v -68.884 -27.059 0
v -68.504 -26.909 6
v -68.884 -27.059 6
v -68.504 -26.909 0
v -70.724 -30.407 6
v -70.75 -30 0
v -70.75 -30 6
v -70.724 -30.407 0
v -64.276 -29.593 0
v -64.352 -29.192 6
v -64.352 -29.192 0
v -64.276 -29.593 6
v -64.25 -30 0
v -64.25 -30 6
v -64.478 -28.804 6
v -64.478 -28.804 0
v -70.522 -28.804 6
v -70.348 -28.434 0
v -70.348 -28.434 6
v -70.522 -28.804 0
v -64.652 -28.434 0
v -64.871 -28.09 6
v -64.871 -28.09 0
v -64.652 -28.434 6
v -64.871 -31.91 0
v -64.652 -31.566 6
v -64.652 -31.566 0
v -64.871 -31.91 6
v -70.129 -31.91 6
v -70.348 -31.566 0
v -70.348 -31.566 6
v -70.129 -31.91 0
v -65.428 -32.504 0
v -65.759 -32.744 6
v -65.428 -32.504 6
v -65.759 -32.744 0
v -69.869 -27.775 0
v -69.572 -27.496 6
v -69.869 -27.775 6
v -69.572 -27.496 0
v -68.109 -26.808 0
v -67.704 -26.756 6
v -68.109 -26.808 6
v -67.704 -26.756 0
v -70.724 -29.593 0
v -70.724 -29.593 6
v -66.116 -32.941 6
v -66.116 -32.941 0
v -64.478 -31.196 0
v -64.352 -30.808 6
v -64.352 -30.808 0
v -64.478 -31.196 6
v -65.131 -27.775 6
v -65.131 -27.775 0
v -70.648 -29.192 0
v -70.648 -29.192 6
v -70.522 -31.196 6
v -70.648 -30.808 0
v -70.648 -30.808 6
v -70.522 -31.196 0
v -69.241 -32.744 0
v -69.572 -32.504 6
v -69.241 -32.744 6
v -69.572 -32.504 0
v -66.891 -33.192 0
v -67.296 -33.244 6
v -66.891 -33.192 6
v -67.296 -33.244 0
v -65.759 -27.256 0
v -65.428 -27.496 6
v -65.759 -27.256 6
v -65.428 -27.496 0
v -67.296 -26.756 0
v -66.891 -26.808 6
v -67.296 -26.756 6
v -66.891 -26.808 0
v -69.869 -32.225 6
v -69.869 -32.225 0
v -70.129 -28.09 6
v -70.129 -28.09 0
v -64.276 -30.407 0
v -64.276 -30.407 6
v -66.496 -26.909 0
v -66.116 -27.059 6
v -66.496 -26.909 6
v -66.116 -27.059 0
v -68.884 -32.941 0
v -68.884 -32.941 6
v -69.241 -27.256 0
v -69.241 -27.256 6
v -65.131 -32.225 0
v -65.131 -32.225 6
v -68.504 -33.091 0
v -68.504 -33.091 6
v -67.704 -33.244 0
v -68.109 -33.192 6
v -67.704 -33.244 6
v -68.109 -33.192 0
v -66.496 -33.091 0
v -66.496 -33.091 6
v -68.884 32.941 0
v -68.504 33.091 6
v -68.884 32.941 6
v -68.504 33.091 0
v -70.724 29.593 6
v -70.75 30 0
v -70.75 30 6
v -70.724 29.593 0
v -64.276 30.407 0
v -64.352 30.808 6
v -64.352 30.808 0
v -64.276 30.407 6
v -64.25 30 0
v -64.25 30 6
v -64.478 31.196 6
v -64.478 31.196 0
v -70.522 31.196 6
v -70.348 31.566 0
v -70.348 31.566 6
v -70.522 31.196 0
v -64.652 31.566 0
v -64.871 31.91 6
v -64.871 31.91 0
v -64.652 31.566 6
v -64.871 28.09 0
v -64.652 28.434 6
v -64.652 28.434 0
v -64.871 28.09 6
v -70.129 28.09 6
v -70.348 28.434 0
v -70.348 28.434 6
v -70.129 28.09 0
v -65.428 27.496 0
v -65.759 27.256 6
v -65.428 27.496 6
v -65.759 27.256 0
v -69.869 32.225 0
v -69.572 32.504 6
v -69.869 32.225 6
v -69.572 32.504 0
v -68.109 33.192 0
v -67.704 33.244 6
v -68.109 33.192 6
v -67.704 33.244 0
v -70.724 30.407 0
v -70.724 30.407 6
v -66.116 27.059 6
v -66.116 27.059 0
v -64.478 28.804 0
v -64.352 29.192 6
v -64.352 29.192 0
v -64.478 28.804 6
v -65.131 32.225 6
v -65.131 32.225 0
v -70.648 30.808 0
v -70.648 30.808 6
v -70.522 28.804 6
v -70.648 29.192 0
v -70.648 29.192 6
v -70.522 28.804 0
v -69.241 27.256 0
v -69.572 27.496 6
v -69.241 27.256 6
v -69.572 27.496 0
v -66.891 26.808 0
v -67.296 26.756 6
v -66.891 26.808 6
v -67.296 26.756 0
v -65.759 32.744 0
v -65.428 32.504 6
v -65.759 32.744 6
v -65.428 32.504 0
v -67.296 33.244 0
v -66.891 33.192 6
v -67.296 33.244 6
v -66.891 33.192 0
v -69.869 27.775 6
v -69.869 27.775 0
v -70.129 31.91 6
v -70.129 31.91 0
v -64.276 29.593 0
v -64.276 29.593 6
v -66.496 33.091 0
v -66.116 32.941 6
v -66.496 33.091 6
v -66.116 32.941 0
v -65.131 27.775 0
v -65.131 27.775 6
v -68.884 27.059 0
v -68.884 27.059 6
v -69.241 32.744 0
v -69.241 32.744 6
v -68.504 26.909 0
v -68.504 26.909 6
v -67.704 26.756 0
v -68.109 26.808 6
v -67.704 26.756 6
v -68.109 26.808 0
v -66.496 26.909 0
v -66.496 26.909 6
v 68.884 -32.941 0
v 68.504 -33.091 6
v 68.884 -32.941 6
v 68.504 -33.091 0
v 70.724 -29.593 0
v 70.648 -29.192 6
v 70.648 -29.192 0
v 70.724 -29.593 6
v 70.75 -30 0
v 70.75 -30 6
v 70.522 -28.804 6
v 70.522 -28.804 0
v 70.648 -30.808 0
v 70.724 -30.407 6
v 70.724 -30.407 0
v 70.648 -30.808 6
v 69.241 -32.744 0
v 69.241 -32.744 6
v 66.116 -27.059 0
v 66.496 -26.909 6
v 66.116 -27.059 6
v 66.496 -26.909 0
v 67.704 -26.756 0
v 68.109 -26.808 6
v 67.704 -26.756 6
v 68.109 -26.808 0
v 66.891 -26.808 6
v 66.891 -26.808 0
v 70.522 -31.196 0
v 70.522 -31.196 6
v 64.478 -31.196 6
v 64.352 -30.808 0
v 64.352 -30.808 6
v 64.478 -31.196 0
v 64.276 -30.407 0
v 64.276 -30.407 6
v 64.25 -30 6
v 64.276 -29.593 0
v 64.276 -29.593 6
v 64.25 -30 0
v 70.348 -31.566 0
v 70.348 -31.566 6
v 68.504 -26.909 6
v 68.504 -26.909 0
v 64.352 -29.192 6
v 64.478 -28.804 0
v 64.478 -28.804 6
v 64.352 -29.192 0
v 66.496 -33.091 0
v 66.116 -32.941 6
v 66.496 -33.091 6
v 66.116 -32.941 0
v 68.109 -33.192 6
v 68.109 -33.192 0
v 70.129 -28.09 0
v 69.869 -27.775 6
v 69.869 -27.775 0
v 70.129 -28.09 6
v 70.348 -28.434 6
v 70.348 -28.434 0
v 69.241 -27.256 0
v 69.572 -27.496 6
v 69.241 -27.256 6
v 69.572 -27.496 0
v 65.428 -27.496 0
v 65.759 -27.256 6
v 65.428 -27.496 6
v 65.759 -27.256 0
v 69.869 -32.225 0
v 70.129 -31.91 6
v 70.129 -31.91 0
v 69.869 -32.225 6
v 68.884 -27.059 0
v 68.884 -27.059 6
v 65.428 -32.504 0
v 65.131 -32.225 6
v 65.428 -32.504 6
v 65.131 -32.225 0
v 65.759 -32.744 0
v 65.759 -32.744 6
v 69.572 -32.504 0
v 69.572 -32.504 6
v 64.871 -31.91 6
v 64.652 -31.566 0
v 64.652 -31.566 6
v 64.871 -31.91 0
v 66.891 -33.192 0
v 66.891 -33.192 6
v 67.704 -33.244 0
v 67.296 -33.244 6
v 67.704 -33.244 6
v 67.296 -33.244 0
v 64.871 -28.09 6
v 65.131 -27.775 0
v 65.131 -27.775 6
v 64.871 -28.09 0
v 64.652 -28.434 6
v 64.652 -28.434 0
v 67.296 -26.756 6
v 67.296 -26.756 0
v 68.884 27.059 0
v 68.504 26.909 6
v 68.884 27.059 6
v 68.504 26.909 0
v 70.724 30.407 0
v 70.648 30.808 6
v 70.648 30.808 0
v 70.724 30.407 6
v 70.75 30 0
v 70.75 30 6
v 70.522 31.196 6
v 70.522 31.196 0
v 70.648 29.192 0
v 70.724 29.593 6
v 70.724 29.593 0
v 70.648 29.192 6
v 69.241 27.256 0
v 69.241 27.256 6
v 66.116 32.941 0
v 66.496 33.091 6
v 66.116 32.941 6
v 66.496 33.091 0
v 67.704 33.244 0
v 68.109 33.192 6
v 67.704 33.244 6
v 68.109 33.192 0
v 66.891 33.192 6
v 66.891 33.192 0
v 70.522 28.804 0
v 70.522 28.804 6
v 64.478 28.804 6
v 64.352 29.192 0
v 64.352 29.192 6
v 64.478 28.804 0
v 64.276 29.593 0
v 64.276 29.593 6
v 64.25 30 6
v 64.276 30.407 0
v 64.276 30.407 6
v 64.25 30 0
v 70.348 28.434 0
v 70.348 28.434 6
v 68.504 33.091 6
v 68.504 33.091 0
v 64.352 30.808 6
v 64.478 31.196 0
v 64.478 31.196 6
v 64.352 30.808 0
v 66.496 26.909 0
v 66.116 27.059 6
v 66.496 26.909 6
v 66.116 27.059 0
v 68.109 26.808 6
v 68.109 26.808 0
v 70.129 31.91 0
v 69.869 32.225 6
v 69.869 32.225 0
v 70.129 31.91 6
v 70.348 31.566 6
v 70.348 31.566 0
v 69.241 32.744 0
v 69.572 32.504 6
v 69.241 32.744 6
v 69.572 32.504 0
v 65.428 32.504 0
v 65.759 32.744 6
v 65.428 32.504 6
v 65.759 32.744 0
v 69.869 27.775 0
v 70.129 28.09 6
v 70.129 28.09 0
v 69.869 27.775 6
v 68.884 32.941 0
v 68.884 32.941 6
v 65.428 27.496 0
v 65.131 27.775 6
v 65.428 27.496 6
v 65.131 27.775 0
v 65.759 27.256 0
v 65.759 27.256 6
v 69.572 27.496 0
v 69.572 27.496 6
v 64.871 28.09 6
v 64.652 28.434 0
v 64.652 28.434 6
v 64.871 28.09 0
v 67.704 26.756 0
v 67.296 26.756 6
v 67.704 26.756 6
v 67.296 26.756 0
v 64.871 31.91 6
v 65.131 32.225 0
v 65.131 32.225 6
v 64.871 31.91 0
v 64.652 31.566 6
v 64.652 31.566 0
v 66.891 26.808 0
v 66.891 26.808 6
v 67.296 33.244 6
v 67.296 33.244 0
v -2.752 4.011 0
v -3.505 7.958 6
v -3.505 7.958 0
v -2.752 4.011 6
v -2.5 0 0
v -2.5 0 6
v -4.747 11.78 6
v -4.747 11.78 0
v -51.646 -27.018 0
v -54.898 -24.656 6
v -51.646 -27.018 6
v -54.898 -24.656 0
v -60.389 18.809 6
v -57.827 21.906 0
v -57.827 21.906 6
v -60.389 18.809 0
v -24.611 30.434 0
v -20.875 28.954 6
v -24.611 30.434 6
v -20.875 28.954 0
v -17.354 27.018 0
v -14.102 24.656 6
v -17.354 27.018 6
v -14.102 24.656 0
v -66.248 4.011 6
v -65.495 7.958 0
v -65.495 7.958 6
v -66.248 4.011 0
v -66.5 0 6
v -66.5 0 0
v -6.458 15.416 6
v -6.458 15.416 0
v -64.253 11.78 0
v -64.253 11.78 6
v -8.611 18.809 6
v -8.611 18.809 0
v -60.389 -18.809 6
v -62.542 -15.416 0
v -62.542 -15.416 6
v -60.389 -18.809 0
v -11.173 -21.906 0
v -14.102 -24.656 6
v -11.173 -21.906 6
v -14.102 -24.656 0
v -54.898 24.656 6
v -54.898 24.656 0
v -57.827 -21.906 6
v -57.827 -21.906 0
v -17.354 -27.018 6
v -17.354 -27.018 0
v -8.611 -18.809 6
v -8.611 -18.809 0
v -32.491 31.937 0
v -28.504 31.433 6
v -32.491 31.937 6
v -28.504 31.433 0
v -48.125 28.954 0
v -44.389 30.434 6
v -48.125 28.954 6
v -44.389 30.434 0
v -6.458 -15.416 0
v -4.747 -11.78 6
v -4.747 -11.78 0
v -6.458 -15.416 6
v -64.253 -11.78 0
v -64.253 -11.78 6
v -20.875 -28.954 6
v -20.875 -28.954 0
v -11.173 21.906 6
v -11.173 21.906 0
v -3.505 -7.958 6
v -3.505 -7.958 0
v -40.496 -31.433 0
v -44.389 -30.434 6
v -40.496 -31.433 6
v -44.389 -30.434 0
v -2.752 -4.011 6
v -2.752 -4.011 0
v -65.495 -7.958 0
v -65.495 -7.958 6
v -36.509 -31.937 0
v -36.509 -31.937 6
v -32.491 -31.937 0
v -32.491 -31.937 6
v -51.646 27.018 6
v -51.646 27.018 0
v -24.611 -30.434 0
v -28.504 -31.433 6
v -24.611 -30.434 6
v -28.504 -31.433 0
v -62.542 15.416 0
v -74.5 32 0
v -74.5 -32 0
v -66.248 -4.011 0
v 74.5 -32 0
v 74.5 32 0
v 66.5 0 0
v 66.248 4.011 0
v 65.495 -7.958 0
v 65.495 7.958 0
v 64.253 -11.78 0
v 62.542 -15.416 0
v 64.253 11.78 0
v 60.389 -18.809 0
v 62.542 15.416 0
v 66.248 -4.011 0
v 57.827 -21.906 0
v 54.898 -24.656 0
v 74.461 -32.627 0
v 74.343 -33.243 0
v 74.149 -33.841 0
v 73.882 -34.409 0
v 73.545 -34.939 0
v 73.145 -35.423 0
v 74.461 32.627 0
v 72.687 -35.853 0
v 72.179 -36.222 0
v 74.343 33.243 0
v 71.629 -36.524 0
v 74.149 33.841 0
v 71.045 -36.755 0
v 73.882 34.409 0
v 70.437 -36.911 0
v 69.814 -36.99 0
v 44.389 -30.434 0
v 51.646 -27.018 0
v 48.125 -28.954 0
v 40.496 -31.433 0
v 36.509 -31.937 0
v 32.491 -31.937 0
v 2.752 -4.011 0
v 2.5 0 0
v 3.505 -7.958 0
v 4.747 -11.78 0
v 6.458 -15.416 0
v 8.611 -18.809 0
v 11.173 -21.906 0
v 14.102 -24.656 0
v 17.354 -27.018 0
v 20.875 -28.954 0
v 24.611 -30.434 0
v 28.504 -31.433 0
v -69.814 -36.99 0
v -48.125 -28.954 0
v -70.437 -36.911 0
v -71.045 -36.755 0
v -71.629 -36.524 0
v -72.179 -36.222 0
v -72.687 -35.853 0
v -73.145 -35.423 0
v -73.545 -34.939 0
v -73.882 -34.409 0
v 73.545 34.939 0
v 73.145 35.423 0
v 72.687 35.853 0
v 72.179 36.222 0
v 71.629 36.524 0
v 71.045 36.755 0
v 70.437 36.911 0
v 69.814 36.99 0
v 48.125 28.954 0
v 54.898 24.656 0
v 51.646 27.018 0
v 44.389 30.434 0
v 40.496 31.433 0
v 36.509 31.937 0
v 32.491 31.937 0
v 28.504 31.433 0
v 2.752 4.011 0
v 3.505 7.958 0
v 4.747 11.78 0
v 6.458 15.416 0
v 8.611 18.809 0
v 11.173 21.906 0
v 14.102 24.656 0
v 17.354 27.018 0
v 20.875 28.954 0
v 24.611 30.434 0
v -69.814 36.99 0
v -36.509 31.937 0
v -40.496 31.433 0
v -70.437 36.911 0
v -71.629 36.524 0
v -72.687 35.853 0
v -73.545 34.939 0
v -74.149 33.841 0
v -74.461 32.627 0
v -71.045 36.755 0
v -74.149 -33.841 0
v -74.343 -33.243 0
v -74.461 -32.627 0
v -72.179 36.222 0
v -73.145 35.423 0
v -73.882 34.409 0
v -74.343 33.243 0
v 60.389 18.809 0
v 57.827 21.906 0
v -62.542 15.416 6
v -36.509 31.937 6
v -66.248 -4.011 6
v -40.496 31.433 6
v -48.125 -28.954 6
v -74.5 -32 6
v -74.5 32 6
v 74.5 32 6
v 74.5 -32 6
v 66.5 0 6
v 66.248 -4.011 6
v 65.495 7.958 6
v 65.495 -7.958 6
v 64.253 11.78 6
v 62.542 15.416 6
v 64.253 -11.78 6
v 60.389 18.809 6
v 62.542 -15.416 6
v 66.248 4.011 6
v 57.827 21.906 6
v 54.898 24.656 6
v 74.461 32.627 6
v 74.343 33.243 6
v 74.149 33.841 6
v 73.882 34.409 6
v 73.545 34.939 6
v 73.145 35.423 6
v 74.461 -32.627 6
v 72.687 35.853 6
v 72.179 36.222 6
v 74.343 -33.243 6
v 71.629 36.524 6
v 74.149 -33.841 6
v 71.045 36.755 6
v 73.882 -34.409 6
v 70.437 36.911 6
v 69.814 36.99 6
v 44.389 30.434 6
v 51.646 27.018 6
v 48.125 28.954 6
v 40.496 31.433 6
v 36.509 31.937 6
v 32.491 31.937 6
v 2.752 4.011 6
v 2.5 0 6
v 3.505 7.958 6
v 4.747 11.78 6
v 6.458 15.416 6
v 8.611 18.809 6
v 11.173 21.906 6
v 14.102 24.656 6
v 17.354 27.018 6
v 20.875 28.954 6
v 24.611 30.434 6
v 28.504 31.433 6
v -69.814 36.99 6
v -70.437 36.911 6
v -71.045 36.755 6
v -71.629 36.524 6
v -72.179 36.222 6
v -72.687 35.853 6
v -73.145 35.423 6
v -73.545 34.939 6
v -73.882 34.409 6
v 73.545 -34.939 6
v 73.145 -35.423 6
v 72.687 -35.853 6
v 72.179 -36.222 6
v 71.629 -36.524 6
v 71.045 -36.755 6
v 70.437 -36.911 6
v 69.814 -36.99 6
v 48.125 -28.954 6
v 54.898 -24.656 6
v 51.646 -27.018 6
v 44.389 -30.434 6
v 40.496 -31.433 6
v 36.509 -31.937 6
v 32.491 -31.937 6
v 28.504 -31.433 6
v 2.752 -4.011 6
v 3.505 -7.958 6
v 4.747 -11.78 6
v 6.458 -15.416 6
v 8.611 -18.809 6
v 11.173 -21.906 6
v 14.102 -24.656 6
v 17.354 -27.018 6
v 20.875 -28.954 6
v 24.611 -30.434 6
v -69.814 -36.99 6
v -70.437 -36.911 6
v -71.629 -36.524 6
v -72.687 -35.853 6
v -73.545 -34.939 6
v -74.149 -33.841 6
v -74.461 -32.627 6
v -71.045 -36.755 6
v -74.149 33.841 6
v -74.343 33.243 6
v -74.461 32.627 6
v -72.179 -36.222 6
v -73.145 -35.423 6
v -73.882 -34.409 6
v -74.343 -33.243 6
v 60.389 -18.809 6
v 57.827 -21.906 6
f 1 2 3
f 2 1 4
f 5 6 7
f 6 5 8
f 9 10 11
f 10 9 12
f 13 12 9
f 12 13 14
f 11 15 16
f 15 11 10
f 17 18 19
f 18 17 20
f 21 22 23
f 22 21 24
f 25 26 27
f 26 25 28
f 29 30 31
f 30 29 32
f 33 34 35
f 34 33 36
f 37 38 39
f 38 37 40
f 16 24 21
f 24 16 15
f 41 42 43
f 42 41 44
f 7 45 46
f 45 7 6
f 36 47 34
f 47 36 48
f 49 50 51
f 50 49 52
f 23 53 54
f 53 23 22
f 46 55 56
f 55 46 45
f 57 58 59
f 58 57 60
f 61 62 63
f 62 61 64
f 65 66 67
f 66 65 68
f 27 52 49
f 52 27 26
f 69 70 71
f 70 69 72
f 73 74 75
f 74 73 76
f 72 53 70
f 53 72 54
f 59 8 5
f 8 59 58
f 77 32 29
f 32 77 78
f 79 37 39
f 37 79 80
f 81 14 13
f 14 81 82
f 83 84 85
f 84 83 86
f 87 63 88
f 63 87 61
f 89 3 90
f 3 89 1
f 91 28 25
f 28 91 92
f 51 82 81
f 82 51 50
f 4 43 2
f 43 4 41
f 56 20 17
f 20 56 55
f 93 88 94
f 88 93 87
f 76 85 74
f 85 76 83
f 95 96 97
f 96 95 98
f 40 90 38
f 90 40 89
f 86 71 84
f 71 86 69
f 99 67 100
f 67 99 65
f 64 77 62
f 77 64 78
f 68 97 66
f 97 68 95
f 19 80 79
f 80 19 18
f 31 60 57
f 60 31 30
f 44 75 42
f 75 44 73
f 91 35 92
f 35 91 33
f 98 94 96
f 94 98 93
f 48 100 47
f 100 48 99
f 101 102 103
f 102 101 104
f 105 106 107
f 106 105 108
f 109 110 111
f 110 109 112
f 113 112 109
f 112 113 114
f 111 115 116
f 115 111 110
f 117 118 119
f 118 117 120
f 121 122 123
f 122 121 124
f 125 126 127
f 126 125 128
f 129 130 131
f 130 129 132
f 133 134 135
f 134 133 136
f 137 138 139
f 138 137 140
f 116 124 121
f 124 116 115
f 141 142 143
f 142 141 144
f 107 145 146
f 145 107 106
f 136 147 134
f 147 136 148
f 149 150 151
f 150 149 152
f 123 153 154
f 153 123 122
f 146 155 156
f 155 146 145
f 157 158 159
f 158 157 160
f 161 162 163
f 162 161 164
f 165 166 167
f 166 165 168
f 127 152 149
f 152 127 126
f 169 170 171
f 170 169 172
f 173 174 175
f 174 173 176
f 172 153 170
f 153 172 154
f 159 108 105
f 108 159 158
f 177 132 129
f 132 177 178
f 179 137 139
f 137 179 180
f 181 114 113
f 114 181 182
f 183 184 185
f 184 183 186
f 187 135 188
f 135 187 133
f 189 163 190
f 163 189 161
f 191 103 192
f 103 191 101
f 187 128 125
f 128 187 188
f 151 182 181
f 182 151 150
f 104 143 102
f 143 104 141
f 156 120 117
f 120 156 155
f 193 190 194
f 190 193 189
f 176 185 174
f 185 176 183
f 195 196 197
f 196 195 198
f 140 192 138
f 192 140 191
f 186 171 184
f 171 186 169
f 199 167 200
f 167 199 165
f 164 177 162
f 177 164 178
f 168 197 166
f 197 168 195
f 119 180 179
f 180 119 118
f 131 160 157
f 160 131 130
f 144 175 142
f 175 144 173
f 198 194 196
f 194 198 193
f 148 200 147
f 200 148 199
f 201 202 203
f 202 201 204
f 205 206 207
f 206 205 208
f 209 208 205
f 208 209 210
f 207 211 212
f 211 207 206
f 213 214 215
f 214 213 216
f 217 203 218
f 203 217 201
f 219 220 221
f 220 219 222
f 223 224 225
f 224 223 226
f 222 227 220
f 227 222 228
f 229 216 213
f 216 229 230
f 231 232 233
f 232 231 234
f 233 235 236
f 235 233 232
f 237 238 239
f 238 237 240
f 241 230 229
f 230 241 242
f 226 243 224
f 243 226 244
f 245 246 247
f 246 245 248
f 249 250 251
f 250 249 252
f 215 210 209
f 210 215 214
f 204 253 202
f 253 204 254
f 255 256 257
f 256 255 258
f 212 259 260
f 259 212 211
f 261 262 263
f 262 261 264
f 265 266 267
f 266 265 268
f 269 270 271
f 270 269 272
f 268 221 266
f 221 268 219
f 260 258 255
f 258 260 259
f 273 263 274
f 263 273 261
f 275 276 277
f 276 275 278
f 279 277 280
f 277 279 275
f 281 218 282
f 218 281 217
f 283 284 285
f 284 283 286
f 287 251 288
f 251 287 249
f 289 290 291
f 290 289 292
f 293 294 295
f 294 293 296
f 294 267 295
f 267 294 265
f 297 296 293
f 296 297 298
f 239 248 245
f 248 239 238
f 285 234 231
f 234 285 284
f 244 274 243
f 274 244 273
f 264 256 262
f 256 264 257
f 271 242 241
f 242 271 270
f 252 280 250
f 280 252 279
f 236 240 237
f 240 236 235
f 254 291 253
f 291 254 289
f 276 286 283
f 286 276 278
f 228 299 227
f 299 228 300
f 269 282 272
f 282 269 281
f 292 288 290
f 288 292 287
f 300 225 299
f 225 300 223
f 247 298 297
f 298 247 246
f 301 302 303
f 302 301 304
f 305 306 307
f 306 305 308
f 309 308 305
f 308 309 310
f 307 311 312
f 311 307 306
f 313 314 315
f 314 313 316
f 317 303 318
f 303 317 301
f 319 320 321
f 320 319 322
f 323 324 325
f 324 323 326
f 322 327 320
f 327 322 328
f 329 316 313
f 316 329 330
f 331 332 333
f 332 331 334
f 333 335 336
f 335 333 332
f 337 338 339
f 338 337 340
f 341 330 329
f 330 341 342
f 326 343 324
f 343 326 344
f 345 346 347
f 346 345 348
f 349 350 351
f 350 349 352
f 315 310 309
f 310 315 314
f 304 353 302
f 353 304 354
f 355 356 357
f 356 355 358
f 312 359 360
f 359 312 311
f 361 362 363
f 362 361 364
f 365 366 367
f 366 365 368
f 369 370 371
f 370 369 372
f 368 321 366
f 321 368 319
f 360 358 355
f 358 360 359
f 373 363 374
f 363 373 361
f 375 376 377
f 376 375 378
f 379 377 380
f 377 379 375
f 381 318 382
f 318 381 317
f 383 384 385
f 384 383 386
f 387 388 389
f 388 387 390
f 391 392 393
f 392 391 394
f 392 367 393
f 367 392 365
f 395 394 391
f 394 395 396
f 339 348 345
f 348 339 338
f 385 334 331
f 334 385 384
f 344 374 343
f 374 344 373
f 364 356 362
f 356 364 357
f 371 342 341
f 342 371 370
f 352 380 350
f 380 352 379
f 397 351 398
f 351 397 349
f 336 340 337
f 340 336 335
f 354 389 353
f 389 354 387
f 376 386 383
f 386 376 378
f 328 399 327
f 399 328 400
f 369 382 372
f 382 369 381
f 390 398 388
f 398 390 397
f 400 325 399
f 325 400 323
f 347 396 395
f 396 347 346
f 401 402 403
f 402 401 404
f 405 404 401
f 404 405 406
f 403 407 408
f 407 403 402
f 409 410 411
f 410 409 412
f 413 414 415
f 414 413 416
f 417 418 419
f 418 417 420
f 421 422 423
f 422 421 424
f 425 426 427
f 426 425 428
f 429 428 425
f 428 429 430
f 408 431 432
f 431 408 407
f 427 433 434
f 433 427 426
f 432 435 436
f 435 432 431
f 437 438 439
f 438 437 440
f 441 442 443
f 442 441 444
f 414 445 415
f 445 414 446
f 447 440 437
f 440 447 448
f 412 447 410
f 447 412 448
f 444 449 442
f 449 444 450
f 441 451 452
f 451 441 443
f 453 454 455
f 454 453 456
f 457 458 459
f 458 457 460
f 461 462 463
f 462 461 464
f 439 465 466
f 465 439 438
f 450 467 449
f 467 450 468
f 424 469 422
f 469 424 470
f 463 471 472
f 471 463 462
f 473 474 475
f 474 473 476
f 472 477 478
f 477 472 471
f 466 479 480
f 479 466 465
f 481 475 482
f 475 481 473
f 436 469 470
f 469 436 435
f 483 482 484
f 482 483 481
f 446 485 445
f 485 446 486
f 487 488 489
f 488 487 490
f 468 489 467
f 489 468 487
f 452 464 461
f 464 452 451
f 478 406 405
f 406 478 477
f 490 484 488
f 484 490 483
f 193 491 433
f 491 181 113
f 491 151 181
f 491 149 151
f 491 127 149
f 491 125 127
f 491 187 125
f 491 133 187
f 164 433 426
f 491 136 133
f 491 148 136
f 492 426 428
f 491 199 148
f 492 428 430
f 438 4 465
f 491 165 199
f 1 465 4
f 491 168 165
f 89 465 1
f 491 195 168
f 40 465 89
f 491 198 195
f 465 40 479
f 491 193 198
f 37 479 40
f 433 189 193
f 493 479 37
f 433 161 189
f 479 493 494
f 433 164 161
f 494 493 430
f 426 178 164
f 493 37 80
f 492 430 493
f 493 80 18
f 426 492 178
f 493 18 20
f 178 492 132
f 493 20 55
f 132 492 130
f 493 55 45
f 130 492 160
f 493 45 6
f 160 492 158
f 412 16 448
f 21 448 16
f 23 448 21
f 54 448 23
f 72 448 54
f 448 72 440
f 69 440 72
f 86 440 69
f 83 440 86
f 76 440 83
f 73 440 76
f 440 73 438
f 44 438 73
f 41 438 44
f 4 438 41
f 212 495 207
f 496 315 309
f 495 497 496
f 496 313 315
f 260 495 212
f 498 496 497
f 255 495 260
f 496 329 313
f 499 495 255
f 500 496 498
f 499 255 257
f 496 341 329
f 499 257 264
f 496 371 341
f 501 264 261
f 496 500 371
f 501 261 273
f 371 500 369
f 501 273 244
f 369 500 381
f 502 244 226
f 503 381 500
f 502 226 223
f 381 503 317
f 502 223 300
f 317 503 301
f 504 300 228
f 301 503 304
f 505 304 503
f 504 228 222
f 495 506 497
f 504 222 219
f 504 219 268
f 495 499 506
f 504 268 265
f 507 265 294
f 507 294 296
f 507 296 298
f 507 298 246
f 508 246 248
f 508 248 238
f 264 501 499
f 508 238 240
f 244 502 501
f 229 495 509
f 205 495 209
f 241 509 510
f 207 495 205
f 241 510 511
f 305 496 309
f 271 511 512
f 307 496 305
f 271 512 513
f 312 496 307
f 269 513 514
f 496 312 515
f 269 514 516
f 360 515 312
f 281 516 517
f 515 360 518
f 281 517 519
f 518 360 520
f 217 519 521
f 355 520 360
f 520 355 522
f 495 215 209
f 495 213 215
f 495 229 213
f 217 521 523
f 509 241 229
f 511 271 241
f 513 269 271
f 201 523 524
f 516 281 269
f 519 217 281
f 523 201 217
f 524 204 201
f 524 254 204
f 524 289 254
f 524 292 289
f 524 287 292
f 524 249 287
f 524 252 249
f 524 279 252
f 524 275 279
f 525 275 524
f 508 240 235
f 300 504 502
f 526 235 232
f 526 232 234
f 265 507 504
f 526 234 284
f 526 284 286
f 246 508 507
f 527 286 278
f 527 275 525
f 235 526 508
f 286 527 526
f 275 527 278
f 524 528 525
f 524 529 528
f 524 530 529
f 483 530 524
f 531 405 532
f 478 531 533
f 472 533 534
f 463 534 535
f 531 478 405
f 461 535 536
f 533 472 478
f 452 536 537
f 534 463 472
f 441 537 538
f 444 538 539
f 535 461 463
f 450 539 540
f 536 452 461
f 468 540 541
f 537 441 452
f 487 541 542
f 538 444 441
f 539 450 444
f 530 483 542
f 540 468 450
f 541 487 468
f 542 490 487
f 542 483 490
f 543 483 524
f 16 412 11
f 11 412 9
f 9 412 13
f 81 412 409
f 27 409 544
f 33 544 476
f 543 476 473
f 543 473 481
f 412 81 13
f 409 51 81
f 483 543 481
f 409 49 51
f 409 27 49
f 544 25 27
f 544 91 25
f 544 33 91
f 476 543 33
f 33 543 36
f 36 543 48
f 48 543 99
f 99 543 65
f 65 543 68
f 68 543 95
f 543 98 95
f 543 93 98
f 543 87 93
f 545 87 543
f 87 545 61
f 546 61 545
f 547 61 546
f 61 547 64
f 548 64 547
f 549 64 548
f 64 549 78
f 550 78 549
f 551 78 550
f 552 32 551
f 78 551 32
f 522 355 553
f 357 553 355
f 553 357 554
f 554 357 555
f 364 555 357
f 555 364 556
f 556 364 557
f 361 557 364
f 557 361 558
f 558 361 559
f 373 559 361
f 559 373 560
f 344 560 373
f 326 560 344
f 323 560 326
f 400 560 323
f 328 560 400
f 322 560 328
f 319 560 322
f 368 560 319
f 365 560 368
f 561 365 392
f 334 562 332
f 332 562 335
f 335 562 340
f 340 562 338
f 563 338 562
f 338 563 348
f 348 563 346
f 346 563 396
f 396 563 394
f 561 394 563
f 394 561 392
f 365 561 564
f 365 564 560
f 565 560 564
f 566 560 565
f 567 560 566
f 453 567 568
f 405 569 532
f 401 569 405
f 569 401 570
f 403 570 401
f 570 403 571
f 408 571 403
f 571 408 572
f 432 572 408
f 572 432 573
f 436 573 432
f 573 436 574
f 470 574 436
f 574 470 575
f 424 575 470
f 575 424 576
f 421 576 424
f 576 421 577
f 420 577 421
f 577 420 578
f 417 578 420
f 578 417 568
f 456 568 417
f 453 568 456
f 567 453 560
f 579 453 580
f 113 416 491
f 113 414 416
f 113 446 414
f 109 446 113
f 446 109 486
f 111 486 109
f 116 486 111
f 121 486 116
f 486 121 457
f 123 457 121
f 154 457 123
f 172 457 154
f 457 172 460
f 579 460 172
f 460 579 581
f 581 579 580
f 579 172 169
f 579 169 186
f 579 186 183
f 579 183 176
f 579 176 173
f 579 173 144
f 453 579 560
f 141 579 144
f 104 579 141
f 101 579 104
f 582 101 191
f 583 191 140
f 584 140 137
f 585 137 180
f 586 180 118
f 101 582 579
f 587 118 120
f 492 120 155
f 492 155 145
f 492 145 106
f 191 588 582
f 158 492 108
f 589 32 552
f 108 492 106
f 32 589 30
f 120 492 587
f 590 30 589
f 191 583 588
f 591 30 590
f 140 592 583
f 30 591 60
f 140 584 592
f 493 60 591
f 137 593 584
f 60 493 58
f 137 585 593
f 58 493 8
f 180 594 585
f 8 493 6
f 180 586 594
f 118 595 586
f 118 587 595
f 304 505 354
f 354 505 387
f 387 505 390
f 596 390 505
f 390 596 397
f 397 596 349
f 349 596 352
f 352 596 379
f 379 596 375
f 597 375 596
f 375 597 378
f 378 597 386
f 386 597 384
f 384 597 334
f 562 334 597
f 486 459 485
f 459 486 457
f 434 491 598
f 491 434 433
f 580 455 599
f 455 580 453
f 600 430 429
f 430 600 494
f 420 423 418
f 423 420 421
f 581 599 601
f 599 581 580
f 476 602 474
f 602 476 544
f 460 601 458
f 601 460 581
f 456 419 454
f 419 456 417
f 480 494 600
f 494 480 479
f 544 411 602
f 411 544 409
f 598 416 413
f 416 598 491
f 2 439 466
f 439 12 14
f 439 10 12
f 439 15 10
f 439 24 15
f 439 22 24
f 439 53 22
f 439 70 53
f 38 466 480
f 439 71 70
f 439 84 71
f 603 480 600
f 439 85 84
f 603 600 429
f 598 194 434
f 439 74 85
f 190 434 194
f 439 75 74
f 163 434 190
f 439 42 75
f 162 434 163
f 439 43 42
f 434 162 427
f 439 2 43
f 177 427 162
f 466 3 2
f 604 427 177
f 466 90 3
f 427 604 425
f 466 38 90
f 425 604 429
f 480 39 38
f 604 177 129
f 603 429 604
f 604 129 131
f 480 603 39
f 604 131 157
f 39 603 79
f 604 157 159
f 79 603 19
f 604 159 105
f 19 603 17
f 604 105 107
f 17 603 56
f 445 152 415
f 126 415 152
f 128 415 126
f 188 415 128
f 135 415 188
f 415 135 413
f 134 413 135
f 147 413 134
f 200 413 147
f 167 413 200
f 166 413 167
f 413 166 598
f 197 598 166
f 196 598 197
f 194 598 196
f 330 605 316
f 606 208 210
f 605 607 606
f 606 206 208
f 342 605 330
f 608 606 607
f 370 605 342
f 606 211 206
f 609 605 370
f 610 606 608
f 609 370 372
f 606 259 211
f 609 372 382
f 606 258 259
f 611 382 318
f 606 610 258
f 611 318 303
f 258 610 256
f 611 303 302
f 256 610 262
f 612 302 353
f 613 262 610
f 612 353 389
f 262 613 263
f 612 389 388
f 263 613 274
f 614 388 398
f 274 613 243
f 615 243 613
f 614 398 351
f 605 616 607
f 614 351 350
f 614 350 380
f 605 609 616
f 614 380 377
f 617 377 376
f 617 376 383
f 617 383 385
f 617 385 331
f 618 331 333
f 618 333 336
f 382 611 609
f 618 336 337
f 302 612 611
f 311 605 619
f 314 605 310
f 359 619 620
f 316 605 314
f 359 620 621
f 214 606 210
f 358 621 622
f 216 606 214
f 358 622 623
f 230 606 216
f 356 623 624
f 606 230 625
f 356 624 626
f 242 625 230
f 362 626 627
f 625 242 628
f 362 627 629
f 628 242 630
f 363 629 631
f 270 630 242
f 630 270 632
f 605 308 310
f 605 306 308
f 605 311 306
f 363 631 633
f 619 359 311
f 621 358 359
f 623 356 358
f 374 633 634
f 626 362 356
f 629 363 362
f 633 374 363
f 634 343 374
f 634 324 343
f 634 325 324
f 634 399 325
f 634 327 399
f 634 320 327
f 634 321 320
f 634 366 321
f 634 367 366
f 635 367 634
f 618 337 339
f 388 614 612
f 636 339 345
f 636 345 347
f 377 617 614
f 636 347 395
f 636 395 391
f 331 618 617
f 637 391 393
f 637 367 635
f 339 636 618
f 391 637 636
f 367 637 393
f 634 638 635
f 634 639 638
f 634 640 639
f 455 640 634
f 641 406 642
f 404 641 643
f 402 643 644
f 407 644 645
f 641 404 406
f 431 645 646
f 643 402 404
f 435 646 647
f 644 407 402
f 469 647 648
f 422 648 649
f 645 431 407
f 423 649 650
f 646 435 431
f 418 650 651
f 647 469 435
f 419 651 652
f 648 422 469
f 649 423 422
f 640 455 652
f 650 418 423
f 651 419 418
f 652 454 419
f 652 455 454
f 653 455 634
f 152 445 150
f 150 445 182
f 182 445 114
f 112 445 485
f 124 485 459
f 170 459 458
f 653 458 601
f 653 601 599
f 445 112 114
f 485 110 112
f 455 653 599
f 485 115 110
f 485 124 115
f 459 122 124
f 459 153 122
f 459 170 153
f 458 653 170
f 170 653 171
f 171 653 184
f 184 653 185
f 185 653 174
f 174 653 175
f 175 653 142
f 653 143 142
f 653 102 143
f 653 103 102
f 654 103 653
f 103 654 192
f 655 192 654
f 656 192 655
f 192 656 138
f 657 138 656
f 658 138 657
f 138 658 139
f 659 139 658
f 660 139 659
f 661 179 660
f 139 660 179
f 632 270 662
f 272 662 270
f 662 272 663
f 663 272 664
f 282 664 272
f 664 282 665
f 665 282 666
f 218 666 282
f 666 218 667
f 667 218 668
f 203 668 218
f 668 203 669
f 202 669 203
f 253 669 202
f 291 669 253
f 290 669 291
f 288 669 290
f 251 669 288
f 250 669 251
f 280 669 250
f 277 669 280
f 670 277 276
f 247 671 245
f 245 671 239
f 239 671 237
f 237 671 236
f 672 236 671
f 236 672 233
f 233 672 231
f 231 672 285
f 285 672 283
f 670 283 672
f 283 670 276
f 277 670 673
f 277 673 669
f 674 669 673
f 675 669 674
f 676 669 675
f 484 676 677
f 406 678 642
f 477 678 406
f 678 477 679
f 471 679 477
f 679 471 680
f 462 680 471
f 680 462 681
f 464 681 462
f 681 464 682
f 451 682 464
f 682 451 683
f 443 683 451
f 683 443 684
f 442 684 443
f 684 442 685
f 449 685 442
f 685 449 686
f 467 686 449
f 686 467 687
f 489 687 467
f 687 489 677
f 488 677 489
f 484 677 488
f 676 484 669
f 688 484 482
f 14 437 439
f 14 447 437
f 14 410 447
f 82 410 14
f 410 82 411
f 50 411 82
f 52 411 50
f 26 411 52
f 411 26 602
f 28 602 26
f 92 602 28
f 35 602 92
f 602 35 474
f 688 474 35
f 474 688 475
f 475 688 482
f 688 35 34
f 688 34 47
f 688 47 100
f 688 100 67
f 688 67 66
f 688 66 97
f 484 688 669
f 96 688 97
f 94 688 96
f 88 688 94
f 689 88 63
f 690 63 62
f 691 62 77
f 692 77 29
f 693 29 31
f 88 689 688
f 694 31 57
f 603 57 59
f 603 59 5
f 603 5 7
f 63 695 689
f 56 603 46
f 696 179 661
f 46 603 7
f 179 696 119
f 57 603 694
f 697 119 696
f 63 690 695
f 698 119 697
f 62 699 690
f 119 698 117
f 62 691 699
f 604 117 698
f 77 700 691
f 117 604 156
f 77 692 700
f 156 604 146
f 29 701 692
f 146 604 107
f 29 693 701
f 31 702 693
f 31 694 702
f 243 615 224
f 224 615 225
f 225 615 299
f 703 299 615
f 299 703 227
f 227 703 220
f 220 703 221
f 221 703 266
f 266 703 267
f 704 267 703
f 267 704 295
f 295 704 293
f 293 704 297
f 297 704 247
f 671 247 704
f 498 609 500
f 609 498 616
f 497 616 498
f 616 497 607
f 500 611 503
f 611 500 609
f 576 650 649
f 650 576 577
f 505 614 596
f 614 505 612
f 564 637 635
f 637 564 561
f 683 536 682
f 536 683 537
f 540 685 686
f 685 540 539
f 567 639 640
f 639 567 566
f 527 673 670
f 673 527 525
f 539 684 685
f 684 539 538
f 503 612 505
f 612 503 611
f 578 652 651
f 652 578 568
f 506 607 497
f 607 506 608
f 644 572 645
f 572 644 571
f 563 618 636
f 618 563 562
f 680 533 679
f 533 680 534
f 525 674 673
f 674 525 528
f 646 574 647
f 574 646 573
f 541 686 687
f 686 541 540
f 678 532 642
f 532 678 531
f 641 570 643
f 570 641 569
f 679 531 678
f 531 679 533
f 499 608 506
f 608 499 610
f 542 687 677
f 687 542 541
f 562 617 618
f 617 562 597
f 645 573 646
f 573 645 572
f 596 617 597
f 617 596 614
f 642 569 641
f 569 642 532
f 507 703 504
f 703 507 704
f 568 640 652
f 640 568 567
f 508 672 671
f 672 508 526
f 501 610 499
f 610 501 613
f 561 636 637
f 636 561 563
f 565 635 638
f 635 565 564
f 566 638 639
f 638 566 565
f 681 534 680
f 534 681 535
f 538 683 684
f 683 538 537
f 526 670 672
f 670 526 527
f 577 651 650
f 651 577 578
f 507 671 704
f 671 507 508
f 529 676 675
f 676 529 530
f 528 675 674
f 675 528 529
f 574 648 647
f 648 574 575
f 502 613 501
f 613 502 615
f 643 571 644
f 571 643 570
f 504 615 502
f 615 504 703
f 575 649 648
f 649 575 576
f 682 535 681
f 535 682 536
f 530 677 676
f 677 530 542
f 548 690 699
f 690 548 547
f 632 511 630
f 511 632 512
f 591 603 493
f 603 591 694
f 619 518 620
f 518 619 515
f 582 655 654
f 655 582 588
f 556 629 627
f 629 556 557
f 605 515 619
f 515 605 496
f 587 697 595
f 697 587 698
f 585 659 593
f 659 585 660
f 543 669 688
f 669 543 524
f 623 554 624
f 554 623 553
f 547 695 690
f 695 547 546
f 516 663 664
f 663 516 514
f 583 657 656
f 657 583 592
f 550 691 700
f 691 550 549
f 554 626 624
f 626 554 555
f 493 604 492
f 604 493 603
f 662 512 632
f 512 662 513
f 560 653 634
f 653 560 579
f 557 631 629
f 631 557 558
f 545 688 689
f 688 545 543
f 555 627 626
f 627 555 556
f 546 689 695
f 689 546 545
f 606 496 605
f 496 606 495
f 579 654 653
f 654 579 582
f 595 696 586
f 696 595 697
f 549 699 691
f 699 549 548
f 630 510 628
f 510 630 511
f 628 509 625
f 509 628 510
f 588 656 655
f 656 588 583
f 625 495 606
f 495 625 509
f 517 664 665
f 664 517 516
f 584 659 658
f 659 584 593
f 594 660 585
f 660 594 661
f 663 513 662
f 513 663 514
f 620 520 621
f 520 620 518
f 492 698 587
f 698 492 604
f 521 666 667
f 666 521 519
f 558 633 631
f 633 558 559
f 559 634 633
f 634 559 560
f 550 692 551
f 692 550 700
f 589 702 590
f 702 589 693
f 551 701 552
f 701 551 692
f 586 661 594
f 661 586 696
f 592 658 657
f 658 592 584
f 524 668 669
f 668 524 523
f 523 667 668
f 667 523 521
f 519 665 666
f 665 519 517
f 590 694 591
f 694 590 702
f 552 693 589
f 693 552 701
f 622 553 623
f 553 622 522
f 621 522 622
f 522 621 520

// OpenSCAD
$fn = 50;

difference() {
	union() {
		hull() {
			translate(v = [-69.5, 32.0, 0]) {
				cylinder(h = 6, r = 5);
			}
			translate(v = [69.5, 32.0, 0]) {
				cylinder(h = 6, r = 5);
			}
			translate(v = [-69.5, -32.0, 0]) {
				cylinder(h = 6, r = 5);
			}
			translate(v = [69.5, -32.0, 0]) {
				cylinder(h = 6, r = 5);
			}
		}
	}
	union() {
		translate(v = [-67.5, -30.0, -100.0]) {
			cylinder(h = 200, r = 3.25);
		}
		translate(v = [-67.5, 30.0, -100.0]) {
			cylinder(h = 200, r = 3.25);
		}
		translate(v = [67.5, -30.0, -100.0]) {
			cylinder(h = 200, r = 3.25);
		}
		translate(v = [67.5, 30.0, -100.0]) {
			cylinder(h = 200, r = 3.25);
		}
		translate(v = [-67.5, -30.0, -100.0]) {
			cylinder(h = 200, r = 1.8);
		}
		translate(v = [-67.5, 30.0, -100.0]) {
			cylinder(h = 200, r = 1.8);
		}
		translate(v = [67.5, -30.0, -100.0]) {
			cylinder(h = 200, r = 1.8);
		}
		translate(v = [67.5, 30.0, -100.0]) {
			cylinder(h = 200, r = 1.8);
		}
		translate(v = [-34.5, 0, 0.0]) {
			cylinder(h = 6, r = 32.0);
		}
		translate(v = [34.5, 0, 0.0]) {
			cylinder(h = 6, r = 32.0);
		}
	}
}
